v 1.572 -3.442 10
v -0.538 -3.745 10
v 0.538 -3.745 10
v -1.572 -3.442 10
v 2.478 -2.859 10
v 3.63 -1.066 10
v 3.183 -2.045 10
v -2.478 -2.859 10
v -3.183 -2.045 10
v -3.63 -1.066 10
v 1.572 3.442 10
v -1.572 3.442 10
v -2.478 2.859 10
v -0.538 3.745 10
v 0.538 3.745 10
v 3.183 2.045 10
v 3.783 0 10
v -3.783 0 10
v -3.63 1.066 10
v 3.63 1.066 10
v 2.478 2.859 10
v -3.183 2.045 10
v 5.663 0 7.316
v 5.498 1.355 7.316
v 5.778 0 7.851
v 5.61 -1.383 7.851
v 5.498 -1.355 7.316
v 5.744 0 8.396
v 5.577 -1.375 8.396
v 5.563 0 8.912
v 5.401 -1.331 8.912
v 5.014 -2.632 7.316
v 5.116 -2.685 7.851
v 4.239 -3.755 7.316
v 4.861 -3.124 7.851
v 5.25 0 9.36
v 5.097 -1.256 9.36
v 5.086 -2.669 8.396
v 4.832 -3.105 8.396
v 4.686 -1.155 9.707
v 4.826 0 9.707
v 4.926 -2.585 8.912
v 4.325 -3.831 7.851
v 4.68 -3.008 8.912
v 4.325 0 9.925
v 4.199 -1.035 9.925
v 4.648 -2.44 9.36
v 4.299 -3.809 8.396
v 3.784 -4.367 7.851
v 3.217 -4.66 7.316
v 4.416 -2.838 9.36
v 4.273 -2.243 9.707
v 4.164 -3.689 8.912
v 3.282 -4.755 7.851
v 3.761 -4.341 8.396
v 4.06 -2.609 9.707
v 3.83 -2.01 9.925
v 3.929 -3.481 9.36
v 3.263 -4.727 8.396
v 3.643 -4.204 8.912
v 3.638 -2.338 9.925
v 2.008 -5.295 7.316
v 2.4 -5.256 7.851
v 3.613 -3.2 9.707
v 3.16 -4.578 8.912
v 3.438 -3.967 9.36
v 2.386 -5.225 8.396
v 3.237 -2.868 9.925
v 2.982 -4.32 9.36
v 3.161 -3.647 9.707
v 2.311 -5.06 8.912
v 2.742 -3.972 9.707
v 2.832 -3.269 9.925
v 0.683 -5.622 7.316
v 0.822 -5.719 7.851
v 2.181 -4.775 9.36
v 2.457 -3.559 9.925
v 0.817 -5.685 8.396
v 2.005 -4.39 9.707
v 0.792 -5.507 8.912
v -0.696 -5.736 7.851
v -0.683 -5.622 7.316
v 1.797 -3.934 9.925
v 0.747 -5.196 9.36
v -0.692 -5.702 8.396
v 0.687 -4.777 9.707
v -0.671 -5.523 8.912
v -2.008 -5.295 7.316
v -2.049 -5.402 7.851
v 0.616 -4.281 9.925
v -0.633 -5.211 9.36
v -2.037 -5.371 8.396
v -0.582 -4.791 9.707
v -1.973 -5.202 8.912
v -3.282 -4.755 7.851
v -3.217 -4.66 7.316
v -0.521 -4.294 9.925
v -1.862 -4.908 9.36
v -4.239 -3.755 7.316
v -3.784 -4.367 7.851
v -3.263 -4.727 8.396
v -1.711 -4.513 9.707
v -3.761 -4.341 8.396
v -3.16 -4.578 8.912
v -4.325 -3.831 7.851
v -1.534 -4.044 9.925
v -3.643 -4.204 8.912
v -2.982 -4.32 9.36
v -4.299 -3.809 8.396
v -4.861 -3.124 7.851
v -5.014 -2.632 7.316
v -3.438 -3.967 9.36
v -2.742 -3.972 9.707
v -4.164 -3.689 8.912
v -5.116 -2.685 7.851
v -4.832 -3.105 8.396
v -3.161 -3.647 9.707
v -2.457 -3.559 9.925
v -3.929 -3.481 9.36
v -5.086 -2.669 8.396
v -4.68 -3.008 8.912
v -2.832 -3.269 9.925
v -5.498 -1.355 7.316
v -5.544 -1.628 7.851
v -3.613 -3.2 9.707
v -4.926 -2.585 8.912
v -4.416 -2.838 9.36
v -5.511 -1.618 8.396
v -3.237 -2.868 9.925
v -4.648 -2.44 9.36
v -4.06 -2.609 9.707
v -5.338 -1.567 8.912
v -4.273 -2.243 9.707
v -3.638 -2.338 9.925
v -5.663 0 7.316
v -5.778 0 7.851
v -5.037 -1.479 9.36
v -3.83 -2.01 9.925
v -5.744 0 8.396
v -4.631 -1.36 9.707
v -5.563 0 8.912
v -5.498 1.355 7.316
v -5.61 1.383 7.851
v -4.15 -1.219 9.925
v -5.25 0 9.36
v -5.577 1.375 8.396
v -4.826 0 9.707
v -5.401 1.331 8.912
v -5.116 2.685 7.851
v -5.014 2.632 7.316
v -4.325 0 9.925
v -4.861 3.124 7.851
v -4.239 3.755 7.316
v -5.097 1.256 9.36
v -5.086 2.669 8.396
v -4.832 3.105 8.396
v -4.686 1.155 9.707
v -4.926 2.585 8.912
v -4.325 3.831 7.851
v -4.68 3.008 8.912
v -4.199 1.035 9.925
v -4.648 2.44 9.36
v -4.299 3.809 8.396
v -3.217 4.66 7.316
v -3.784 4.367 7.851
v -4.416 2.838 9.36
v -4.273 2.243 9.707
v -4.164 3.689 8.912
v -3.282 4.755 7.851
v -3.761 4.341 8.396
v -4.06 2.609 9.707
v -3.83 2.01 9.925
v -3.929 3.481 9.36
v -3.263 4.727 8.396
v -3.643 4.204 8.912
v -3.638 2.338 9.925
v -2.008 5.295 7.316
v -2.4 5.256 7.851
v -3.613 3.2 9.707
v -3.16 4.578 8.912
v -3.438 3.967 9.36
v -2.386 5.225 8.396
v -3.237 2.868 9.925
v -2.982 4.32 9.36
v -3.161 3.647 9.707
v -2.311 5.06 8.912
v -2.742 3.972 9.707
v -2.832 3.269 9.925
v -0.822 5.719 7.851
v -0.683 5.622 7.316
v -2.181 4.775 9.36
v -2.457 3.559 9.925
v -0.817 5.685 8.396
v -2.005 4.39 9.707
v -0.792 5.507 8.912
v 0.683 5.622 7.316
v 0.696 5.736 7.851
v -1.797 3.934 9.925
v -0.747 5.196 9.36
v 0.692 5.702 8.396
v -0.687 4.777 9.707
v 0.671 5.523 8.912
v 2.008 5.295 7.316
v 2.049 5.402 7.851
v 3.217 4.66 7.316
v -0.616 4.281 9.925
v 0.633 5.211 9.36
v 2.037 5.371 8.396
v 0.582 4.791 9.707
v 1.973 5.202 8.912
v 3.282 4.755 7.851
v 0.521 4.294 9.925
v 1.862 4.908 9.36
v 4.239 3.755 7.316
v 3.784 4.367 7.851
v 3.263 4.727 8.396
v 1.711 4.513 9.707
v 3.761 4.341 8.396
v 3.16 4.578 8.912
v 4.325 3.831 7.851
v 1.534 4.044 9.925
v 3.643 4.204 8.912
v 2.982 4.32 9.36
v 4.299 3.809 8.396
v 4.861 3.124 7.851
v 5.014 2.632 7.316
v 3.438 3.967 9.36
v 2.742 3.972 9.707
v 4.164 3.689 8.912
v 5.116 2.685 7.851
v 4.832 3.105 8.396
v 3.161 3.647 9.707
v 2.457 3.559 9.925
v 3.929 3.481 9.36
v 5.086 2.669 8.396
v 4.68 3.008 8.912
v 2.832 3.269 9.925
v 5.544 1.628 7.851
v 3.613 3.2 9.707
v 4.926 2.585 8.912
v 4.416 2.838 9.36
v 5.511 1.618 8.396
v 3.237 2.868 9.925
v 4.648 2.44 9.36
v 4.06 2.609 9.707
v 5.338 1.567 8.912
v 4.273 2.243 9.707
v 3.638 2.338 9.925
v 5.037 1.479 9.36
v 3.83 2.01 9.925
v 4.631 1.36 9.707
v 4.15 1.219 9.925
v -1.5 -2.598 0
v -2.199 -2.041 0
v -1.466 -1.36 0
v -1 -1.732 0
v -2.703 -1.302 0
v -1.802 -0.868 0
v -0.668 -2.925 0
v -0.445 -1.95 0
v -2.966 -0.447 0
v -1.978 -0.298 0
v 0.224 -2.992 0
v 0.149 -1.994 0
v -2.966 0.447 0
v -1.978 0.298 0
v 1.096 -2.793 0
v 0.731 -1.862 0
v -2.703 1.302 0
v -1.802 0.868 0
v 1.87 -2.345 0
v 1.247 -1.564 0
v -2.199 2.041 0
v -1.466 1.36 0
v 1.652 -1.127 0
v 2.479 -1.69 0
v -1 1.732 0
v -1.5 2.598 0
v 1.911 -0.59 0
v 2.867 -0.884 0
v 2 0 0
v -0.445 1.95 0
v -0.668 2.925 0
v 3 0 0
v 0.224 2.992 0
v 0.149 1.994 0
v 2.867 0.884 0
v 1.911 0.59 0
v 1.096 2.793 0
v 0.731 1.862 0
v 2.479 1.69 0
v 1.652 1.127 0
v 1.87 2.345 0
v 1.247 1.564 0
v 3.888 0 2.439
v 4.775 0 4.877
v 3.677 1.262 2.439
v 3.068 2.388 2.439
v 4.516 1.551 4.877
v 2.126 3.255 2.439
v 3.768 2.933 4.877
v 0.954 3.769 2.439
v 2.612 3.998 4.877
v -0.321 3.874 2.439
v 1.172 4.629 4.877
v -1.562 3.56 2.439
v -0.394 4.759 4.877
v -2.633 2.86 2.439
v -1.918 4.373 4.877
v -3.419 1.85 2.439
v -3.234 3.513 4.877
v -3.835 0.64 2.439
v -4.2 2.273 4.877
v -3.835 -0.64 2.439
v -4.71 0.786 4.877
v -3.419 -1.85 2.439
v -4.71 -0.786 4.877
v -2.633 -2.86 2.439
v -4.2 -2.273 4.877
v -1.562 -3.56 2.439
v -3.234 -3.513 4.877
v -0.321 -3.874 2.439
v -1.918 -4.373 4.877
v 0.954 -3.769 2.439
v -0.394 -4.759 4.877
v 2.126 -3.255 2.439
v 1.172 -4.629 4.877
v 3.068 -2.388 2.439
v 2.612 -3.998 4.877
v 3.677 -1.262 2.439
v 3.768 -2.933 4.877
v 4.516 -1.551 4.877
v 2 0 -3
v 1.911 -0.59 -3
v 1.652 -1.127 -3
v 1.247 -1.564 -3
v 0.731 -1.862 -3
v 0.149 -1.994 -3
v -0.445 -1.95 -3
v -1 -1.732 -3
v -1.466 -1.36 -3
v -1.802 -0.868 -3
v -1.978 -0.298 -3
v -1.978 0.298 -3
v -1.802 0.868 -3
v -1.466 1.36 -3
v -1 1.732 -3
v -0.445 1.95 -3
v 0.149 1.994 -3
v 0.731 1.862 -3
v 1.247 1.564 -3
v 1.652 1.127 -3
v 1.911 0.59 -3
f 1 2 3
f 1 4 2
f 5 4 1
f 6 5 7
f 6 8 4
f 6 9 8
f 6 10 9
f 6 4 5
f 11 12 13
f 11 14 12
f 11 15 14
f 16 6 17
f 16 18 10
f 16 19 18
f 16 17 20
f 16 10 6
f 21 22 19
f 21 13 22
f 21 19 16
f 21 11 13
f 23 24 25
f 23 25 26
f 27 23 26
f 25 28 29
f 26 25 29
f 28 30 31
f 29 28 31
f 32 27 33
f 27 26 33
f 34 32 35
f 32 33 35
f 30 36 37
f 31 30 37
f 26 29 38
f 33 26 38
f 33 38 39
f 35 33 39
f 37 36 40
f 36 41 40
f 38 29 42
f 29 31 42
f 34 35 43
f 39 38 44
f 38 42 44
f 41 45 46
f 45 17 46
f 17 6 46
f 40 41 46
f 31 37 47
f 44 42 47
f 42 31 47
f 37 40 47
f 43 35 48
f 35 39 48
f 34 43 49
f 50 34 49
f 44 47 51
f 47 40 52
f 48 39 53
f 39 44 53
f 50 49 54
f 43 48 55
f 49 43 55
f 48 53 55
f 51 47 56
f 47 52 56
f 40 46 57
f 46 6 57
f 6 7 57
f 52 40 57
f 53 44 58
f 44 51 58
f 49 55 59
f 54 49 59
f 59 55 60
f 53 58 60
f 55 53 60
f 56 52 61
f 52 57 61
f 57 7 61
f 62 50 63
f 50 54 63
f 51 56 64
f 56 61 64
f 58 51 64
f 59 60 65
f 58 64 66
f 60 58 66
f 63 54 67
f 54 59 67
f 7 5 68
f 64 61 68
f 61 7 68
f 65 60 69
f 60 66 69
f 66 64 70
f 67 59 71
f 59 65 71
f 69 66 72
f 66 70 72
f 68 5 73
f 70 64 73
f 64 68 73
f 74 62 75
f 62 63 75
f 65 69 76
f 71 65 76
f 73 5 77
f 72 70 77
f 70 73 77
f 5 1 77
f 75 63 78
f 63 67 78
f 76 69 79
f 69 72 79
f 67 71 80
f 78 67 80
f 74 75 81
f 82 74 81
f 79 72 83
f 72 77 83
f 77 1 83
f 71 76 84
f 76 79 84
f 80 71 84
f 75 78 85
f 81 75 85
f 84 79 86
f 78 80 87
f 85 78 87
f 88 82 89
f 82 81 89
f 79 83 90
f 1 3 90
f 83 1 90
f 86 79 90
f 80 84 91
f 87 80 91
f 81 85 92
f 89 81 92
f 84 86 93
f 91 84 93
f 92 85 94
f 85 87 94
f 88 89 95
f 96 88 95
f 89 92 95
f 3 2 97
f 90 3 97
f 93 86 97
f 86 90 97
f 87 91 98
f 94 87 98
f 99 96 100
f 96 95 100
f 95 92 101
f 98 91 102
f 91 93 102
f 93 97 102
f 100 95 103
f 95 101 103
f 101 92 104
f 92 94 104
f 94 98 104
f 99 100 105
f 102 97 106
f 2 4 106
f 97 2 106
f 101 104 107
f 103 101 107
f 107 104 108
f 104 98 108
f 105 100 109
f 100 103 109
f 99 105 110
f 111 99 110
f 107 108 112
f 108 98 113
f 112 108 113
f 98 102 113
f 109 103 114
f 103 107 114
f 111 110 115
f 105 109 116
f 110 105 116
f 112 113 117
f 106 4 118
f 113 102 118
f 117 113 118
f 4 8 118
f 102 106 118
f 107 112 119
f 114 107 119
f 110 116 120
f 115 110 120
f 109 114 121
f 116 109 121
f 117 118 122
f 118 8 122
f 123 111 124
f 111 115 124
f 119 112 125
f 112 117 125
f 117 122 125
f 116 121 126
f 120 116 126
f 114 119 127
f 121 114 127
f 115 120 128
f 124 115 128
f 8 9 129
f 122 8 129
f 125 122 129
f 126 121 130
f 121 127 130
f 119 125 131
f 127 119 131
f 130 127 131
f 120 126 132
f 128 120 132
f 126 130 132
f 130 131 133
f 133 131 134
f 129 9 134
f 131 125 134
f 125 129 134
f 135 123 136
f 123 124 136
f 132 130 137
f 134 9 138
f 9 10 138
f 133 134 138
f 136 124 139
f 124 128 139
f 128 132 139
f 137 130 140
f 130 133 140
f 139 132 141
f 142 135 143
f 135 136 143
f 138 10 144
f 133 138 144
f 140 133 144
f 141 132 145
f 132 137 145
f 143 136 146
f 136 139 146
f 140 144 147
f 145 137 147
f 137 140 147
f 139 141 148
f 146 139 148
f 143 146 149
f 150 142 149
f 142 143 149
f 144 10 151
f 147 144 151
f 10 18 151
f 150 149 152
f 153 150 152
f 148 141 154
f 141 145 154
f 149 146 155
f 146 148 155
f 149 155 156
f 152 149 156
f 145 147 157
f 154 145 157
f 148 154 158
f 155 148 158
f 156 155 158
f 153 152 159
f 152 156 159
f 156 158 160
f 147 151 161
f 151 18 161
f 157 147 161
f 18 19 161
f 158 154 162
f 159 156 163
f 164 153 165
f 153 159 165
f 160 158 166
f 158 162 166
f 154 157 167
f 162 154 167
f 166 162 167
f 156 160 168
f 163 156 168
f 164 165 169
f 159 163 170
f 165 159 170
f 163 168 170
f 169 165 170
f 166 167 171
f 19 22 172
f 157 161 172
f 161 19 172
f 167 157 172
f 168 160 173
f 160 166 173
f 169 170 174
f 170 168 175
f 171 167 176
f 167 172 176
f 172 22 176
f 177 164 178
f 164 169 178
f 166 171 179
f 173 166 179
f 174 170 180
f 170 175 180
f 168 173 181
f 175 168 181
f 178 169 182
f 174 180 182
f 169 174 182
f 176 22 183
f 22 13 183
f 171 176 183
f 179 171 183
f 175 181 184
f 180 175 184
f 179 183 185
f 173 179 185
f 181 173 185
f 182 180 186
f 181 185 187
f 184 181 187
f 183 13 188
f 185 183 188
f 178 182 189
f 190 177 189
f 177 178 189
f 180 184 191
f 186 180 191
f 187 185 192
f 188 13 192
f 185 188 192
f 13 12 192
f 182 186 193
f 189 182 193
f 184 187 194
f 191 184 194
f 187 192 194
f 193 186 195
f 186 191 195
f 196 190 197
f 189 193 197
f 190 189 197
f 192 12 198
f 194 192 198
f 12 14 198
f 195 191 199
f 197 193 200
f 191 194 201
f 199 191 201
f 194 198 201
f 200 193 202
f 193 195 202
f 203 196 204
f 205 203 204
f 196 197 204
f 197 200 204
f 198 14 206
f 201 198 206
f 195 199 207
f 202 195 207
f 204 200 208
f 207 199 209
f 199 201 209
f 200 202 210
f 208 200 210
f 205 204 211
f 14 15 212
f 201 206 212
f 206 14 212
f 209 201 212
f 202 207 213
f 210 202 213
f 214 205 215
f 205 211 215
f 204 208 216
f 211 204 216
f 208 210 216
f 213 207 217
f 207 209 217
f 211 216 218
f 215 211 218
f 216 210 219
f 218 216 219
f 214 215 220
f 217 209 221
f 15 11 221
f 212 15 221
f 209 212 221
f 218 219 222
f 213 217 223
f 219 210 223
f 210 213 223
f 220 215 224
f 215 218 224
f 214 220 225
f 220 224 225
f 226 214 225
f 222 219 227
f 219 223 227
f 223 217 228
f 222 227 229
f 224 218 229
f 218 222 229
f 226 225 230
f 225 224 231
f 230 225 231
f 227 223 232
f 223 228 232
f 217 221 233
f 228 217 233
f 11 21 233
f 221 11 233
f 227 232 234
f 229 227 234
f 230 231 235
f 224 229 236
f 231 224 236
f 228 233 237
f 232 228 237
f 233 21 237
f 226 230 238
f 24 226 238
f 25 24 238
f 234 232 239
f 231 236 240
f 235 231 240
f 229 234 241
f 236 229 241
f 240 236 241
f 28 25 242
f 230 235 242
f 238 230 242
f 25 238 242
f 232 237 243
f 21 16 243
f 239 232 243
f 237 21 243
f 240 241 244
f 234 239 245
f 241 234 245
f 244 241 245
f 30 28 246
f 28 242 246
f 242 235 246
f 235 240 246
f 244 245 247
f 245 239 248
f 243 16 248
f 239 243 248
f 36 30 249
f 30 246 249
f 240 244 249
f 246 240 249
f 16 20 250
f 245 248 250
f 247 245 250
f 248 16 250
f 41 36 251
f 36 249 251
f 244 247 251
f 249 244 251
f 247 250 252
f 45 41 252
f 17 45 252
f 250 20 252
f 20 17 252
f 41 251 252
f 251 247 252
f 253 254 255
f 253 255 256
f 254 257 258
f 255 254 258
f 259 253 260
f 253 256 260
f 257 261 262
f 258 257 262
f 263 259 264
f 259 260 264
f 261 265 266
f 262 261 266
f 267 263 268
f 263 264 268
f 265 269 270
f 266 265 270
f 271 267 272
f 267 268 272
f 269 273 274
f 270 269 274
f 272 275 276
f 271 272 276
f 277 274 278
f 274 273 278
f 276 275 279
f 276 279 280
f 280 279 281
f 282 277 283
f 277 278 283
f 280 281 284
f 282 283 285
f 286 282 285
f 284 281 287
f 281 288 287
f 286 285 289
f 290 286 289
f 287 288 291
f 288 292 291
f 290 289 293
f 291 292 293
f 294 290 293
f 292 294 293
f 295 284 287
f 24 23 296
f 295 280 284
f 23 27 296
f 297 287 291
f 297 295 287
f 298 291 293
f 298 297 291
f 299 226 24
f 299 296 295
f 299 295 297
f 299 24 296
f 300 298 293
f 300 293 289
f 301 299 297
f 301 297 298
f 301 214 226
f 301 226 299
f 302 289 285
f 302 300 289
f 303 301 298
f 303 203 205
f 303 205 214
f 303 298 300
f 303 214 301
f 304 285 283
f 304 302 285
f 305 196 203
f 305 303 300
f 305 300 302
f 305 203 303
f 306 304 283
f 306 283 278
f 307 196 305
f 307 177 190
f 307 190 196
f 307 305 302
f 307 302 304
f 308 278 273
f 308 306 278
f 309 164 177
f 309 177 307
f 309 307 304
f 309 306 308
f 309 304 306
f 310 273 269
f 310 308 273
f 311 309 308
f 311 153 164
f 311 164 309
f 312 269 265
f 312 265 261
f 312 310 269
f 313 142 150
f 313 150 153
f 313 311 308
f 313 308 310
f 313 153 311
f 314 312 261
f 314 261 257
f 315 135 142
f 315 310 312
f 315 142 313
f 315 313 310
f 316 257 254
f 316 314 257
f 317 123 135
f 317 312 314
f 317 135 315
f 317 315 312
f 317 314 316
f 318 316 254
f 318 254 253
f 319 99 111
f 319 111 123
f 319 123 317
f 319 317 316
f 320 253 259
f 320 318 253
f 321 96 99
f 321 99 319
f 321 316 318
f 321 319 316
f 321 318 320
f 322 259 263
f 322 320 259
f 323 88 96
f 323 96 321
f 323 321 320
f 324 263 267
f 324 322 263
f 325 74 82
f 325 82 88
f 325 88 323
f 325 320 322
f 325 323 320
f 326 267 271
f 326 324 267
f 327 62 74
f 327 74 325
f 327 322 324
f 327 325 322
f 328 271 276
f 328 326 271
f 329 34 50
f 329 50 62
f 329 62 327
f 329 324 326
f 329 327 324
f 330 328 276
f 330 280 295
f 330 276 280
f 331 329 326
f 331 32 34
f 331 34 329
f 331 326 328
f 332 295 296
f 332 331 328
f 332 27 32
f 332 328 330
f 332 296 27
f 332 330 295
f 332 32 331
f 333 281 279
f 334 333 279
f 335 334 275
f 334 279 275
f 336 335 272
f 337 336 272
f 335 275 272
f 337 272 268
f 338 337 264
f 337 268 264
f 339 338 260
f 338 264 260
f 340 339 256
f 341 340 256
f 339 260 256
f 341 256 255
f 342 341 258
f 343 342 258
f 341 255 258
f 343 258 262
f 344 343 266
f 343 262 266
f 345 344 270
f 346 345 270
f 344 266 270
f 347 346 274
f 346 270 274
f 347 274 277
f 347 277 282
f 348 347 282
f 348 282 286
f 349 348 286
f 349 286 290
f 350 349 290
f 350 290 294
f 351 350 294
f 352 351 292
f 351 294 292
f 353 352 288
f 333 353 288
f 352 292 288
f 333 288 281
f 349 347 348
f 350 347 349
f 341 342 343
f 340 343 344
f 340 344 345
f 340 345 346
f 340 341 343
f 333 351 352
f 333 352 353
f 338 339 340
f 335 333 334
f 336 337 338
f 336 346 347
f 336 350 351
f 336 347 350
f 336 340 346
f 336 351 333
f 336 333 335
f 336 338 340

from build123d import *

# Parameters (mm, degrees)
F0_R     = 3
F1_DEPTH = 10
F1_TAPER = -20
F2_R     = 2
F3_R     = 2
F4_DEPTH = 3


with BuildPart() as f1:
    # F0 (on Top) → F1 (new body)
    with BuildSketch(Plane.XY):
        Circle(F0_R)
    extrude(amount=F1_DEPTH, taper=F1_TAPER)

    # F2
    f2_edges = [f1.edges().sort_by_distance(p)[0] for p in [
        (-6.639702, 0, 10),
    ]]
    fillet(f2_edges, radius=F2_R)

    # F3 (on face) → F4 (join)
    with BuildSketch(Plane(origin=(0, 0, 0), x_dir=(1, 0, 0), z_dir=(0, 0, -1))):
        Circle(F3_R)
    extrude(amount=F4_DEPTH)


solid = f1.part
